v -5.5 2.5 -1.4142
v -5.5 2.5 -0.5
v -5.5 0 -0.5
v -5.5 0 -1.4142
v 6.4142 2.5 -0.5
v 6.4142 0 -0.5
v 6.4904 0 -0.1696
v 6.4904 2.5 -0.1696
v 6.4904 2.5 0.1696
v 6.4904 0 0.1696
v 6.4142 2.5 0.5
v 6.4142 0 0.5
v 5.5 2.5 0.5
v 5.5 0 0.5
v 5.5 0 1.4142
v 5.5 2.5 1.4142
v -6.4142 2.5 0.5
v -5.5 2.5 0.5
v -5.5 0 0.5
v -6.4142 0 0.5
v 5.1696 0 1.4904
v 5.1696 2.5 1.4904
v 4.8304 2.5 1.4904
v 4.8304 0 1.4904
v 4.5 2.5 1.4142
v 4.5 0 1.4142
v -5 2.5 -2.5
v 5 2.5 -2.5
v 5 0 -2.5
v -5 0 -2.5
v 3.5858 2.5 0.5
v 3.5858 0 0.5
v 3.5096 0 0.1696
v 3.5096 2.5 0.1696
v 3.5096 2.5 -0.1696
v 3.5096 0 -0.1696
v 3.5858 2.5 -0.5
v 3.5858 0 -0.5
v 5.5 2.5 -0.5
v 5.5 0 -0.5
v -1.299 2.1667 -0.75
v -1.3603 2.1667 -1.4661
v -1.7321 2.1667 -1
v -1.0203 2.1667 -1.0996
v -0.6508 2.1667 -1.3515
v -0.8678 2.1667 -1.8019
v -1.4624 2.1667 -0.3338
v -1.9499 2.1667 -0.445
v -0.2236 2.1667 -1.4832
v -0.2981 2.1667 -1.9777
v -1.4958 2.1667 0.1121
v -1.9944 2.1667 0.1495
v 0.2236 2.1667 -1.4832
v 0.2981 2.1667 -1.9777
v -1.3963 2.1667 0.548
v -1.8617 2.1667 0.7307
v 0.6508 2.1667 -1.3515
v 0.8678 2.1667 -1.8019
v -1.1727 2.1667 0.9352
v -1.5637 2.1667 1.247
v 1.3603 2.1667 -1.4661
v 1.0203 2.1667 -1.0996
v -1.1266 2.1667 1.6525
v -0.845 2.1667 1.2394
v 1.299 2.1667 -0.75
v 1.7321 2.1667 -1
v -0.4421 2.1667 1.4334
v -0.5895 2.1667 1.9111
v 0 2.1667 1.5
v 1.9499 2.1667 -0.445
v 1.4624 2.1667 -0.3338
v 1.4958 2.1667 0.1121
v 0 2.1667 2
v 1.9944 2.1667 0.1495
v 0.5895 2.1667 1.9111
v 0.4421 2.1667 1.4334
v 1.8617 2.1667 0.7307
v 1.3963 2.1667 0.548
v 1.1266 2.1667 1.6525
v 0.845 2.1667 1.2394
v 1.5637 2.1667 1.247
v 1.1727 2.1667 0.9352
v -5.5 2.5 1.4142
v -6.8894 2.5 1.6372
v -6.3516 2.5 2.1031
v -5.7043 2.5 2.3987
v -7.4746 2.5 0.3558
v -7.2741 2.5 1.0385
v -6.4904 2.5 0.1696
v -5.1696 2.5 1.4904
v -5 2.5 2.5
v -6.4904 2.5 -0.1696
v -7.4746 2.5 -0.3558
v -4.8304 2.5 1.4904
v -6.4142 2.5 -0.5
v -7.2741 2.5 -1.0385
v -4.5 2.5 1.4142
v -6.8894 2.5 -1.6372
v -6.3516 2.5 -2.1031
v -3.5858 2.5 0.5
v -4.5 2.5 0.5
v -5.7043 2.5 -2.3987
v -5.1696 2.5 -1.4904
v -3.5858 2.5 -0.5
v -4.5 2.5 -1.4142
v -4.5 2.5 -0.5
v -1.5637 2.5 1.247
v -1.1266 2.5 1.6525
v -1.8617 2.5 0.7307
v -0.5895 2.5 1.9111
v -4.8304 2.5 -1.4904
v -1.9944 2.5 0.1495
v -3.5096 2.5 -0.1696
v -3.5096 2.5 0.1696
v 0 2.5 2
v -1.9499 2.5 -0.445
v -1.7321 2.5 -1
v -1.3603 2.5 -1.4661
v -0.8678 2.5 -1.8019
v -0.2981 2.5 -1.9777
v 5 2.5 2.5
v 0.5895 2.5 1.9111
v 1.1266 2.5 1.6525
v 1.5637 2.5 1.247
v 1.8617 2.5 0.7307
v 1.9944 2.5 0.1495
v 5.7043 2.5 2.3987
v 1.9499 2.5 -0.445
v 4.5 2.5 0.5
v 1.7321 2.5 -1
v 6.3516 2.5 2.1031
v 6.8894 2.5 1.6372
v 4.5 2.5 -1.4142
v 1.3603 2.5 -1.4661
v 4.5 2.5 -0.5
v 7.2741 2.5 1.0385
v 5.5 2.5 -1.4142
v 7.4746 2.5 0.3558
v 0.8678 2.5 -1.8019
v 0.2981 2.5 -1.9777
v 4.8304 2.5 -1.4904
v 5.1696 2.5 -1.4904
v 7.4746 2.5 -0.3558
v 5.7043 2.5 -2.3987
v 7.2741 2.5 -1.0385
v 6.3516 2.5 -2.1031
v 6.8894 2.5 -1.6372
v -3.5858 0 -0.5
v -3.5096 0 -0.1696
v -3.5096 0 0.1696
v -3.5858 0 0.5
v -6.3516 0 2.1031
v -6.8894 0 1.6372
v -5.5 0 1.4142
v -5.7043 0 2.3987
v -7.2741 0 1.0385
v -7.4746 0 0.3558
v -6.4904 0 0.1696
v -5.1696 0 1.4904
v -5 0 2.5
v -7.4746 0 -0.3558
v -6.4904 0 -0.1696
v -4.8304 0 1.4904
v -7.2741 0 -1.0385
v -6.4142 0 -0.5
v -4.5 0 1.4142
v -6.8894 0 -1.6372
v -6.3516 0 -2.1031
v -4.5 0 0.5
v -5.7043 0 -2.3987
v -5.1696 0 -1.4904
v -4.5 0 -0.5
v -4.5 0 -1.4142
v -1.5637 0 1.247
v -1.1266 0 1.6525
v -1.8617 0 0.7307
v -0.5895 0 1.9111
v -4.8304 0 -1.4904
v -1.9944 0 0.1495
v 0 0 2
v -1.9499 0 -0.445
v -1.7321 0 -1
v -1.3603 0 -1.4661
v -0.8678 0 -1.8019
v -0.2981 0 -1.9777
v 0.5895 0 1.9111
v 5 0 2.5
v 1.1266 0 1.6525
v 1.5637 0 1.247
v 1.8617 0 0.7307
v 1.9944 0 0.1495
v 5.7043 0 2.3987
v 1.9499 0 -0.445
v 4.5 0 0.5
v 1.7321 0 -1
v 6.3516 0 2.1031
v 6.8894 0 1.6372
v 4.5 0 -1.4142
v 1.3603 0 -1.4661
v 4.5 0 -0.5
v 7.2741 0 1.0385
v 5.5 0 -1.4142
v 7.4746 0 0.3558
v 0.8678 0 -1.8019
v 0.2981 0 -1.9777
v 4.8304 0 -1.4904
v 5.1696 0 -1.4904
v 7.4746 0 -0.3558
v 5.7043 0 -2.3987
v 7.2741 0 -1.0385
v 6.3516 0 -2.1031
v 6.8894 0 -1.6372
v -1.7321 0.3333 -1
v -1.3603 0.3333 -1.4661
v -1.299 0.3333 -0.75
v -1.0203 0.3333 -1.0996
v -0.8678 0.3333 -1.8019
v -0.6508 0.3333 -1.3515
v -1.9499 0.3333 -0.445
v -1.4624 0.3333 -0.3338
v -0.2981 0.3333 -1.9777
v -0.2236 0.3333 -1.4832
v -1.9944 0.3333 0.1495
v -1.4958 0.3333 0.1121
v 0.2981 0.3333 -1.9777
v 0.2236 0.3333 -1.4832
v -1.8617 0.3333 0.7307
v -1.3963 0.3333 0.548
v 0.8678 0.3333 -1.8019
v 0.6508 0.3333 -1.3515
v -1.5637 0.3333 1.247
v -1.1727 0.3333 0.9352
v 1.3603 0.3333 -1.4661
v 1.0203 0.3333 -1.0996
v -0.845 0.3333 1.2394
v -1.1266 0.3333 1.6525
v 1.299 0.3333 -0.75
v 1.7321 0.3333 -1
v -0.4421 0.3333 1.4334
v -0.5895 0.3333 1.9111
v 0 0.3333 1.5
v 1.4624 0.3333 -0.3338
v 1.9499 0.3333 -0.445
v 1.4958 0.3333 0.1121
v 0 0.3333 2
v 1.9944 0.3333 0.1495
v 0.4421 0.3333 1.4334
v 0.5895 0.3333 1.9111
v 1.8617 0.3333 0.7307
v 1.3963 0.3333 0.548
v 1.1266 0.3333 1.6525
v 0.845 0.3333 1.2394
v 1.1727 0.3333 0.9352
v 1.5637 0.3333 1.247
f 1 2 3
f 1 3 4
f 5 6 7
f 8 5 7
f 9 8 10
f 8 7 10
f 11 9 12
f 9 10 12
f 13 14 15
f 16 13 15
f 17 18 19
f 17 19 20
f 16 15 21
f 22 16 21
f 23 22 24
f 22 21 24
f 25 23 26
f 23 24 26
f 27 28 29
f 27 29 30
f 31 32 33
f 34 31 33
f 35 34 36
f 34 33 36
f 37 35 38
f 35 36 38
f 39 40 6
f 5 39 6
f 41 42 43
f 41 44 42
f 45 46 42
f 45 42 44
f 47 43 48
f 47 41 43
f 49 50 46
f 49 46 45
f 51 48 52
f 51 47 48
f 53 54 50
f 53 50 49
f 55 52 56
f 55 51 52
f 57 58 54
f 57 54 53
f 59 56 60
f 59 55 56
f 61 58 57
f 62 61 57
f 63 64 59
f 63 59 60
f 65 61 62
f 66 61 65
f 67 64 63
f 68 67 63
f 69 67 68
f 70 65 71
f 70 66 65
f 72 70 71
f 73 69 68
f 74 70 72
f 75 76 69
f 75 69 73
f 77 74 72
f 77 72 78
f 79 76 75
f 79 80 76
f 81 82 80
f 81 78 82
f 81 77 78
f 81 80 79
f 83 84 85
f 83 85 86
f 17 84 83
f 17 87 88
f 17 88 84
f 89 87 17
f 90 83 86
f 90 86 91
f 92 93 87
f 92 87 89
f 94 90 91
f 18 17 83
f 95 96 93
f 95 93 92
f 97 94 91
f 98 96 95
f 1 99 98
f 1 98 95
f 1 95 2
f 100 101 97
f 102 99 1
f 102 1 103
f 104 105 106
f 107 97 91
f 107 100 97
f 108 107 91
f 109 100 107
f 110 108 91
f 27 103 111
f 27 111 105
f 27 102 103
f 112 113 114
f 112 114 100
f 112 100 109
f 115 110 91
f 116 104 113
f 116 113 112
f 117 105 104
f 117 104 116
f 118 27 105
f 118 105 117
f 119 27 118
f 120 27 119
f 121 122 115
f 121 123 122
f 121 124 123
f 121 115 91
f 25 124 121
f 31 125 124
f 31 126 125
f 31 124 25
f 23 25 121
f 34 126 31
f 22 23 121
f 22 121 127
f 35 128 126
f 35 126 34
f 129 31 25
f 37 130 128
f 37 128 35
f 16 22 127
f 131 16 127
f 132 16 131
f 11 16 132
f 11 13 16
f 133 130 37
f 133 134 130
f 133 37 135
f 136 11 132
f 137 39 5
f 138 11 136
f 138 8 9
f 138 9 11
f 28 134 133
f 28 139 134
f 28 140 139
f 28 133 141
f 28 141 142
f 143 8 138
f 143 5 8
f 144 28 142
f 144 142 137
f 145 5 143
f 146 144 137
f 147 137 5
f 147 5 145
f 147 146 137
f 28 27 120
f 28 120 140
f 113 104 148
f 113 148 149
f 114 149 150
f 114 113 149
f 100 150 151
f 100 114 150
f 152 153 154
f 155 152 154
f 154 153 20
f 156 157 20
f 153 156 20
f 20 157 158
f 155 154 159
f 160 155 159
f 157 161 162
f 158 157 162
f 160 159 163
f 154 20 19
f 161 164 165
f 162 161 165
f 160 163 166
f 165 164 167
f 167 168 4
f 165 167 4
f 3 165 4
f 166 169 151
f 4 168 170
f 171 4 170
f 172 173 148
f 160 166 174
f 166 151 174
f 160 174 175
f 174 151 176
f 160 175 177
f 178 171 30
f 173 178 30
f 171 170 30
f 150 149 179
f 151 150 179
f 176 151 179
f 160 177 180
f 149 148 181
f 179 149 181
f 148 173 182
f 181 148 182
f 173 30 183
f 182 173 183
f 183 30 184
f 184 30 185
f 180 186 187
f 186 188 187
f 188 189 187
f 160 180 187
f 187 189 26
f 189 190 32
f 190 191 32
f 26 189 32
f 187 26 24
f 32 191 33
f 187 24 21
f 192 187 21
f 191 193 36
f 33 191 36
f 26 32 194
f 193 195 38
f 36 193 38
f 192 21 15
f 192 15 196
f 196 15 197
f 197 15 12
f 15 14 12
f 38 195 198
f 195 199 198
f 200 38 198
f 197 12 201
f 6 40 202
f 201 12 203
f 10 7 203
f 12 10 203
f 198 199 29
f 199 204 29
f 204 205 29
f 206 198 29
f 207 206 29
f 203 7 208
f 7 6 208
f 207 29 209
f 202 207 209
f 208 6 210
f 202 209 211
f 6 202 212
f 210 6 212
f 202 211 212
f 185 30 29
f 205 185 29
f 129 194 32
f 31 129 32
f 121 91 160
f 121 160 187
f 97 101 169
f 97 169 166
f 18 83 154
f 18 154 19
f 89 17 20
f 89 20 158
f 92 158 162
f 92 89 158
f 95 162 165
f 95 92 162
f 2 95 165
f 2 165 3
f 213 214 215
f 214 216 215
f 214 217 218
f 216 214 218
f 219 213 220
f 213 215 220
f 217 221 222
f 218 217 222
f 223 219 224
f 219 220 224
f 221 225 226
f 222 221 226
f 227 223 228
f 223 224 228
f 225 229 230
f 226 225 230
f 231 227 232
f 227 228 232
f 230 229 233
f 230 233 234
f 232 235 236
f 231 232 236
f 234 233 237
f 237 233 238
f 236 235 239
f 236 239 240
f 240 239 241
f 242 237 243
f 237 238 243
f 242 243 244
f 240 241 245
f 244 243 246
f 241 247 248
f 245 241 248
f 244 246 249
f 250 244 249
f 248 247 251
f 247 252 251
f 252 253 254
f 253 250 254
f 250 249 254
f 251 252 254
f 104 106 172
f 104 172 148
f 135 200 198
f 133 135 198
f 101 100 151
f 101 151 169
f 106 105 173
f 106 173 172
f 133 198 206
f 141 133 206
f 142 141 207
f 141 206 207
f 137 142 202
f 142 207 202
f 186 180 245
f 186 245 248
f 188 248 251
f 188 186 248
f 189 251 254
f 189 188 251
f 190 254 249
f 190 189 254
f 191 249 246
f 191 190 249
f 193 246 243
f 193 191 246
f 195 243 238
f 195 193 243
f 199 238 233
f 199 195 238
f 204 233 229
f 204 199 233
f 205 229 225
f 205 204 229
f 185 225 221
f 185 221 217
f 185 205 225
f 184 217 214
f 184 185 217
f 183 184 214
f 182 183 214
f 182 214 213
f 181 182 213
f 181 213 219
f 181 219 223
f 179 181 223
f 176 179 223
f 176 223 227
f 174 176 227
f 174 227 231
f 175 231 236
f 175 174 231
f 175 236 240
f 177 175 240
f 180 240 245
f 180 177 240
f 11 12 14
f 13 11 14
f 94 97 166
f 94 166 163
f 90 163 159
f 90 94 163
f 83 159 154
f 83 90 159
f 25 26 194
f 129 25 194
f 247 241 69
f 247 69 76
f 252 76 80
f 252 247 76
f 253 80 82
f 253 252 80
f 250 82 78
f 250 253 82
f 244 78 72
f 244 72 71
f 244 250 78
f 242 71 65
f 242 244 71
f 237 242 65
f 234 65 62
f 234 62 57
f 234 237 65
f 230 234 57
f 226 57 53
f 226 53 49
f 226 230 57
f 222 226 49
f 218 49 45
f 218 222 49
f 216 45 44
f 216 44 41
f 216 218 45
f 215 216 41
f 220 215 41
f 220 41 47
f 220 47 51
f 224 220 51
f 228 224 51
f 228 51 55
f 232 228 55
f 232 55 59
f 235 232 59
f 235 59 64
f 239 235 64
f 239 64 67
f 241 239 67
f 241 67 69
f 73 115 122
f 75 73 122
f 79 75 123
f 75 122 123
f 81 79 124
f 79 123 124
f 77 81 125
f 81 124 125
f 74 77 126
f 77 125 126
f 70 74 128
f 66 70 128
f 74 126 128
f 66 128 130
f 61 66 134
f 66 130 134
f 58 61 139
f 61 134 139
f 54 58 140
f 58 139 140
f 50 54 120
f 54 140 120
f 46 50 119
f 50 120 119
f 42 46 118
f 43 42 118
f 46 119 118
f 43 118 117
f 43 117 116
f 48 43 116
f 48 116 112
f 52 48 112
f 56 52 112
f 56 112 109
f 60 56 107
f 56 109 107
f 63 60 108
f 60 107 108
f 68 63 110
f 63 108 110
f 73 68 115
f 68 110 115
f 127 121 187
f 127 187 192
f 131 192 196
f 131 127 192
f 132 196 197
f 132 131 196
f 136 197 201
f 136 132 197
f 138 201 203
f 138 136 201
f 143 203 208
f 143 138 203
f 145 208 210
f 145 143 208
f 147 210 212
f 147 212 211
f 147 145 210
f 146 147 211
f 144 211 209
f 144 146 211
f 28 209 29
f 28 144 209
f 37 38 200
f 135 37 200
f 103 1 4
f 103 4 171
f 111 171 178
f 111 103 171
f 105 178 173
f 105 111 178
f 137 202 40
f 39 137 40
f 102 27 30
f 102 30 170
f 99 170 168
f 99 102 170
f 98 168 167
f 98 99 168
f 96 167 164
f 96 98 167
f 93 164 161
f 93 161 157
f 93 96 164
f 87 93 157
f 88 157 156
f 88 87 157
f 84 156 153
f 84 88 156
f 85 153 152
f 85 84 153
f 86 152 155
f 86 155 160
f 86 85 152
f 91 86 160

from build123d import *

# Parameters (mm, degrees)
SKETCH1_R           = 1.5
BOSS_EXTRUDE1_DEPTH = 1.25
SKETCH1_3_R         = 2
SKETCH1_3_R_2       = 1.5
CUT_EXTRUDE1_DEPTH  = 0.333333333


with BuildPart() as part:
    # Sketch1 → Boss-Extrude1 (new body)
    with BuildSketch(Plane(origin=(0, 0, 0), x_dir=(1, 0, 0), z_dir=(0, 1, 0))):
        with BuildLine():
            Line((5, 2.5), (-5, 2.5))
            ThreePointArc((-5, 2.5), (-7.5, 0), (-5, -2.5))
            Line((-5, -2.5), (5.000000022, -2.5))
            ThreePointArc((5.000000022, -2.5), (7.5, 1.1e-08), (5, 2.5))
        make_face()
        with BuildLine():
            Line((4.5, 0.5), (4.5, 1.414213562))
            ThreePointArc((4.5, 1.414213562), (5, 1.5), (5.5, 1.414213562))
            Line((5.5, 1.414213562), (5.5, 0.5))
            Line((5.5, 0.5), (6.414213562, 0.5))
            ThreePointArc((6.414213562, 0.5), (6.5, 0), (6.414213562, -0.5))
            Line((6.414213562, -0.5), (5.5, -0.5))
            Line((5.5, -0.5), (5.5, -1.414213562))
            ThreePointArc((5.5, -1.414213562), (5, -1.5), (4.5, -1.414213562))
            Line((4.5, -1.414213562), (4.5, -0.5))
            Line((4.5, -0.5), (3.585786438, -0.5))
            ThreePointArc((3.585786438, -0.5), (3.5, 0), (3.585786438, 0.5))
            Line((3.585786438, 0.5), (4.5, 0.5))
        make_face(mode=Mode.SUBTRACT)
        Circle(SKETCH1_R, mode=Mode.SUBTRACT)
        with BuildLine():
            Line((-5.5, -1.414213562), (-5.5, -0.5))
            Line((-5.5, -0.5), (-6.414213562, -0.5))
            ThreePointArc((-6.414213562, -0.5), (-6.5, 0), (-6.414213562, 0.5))
            Line((-6.414213562, 0.5), (-5.5, 0.5))
            Line((-5.5, 0.5), (-5.5, 1.414213562))
            ThreePointArc((-5.5, 1.414213562), (-5, 1.5), (-4.5, 1.414213562))
            Line((-4.5, 1.414213562), (-4.5, 0.5))
            Line((-4.5, 0.5), (-3.585786438, 0.5))
            ThreePointArc((-3.585786438, 0.5), (-3.5, 0), (-3.585786438, -0.5))
            Line((-3.585786438, -0.5), (-4.5, -0.5))
            Line((-4.5, -0.5), (-4.5, -1.414213562))
            ThreePointArc((-4.5, -1.414213562), (-5, -1.5), (-5.5, -1.414213562))
        make_face(mode=Mode.SUBTRACT)
    boss_extrude1 = extrude(amount=BOSS_EXTRUDE1_DEPTH)

    # Sketch1<3> → Cut-Extrude1 (cut)
    with BuildSketch(Plane(origin=(0, 0, 0), x_dir=(1, 0, 0), z_dir=(0, 1, 0))):
        Circle(SKETCH1_3_R)
        Circle(SKETCH1_3_R_2, mode=Mode.SUBTRACT)
    cut_extrude1 = extrude(amount=CUT_EXTRUDE1_DEPTH, mode=Mode.SUBTRACT)

    # Mirror1: Boss-Extrude1, Cut-Extrude1 across plane
    add(boss_extrude1.mirror(Plane.ZX.offset(1.25)))
    add(cut_extrude1.mirror(Plane.ZX.offset(1.25)), mode=Mode.SUBTRACT)


solid = part.part
